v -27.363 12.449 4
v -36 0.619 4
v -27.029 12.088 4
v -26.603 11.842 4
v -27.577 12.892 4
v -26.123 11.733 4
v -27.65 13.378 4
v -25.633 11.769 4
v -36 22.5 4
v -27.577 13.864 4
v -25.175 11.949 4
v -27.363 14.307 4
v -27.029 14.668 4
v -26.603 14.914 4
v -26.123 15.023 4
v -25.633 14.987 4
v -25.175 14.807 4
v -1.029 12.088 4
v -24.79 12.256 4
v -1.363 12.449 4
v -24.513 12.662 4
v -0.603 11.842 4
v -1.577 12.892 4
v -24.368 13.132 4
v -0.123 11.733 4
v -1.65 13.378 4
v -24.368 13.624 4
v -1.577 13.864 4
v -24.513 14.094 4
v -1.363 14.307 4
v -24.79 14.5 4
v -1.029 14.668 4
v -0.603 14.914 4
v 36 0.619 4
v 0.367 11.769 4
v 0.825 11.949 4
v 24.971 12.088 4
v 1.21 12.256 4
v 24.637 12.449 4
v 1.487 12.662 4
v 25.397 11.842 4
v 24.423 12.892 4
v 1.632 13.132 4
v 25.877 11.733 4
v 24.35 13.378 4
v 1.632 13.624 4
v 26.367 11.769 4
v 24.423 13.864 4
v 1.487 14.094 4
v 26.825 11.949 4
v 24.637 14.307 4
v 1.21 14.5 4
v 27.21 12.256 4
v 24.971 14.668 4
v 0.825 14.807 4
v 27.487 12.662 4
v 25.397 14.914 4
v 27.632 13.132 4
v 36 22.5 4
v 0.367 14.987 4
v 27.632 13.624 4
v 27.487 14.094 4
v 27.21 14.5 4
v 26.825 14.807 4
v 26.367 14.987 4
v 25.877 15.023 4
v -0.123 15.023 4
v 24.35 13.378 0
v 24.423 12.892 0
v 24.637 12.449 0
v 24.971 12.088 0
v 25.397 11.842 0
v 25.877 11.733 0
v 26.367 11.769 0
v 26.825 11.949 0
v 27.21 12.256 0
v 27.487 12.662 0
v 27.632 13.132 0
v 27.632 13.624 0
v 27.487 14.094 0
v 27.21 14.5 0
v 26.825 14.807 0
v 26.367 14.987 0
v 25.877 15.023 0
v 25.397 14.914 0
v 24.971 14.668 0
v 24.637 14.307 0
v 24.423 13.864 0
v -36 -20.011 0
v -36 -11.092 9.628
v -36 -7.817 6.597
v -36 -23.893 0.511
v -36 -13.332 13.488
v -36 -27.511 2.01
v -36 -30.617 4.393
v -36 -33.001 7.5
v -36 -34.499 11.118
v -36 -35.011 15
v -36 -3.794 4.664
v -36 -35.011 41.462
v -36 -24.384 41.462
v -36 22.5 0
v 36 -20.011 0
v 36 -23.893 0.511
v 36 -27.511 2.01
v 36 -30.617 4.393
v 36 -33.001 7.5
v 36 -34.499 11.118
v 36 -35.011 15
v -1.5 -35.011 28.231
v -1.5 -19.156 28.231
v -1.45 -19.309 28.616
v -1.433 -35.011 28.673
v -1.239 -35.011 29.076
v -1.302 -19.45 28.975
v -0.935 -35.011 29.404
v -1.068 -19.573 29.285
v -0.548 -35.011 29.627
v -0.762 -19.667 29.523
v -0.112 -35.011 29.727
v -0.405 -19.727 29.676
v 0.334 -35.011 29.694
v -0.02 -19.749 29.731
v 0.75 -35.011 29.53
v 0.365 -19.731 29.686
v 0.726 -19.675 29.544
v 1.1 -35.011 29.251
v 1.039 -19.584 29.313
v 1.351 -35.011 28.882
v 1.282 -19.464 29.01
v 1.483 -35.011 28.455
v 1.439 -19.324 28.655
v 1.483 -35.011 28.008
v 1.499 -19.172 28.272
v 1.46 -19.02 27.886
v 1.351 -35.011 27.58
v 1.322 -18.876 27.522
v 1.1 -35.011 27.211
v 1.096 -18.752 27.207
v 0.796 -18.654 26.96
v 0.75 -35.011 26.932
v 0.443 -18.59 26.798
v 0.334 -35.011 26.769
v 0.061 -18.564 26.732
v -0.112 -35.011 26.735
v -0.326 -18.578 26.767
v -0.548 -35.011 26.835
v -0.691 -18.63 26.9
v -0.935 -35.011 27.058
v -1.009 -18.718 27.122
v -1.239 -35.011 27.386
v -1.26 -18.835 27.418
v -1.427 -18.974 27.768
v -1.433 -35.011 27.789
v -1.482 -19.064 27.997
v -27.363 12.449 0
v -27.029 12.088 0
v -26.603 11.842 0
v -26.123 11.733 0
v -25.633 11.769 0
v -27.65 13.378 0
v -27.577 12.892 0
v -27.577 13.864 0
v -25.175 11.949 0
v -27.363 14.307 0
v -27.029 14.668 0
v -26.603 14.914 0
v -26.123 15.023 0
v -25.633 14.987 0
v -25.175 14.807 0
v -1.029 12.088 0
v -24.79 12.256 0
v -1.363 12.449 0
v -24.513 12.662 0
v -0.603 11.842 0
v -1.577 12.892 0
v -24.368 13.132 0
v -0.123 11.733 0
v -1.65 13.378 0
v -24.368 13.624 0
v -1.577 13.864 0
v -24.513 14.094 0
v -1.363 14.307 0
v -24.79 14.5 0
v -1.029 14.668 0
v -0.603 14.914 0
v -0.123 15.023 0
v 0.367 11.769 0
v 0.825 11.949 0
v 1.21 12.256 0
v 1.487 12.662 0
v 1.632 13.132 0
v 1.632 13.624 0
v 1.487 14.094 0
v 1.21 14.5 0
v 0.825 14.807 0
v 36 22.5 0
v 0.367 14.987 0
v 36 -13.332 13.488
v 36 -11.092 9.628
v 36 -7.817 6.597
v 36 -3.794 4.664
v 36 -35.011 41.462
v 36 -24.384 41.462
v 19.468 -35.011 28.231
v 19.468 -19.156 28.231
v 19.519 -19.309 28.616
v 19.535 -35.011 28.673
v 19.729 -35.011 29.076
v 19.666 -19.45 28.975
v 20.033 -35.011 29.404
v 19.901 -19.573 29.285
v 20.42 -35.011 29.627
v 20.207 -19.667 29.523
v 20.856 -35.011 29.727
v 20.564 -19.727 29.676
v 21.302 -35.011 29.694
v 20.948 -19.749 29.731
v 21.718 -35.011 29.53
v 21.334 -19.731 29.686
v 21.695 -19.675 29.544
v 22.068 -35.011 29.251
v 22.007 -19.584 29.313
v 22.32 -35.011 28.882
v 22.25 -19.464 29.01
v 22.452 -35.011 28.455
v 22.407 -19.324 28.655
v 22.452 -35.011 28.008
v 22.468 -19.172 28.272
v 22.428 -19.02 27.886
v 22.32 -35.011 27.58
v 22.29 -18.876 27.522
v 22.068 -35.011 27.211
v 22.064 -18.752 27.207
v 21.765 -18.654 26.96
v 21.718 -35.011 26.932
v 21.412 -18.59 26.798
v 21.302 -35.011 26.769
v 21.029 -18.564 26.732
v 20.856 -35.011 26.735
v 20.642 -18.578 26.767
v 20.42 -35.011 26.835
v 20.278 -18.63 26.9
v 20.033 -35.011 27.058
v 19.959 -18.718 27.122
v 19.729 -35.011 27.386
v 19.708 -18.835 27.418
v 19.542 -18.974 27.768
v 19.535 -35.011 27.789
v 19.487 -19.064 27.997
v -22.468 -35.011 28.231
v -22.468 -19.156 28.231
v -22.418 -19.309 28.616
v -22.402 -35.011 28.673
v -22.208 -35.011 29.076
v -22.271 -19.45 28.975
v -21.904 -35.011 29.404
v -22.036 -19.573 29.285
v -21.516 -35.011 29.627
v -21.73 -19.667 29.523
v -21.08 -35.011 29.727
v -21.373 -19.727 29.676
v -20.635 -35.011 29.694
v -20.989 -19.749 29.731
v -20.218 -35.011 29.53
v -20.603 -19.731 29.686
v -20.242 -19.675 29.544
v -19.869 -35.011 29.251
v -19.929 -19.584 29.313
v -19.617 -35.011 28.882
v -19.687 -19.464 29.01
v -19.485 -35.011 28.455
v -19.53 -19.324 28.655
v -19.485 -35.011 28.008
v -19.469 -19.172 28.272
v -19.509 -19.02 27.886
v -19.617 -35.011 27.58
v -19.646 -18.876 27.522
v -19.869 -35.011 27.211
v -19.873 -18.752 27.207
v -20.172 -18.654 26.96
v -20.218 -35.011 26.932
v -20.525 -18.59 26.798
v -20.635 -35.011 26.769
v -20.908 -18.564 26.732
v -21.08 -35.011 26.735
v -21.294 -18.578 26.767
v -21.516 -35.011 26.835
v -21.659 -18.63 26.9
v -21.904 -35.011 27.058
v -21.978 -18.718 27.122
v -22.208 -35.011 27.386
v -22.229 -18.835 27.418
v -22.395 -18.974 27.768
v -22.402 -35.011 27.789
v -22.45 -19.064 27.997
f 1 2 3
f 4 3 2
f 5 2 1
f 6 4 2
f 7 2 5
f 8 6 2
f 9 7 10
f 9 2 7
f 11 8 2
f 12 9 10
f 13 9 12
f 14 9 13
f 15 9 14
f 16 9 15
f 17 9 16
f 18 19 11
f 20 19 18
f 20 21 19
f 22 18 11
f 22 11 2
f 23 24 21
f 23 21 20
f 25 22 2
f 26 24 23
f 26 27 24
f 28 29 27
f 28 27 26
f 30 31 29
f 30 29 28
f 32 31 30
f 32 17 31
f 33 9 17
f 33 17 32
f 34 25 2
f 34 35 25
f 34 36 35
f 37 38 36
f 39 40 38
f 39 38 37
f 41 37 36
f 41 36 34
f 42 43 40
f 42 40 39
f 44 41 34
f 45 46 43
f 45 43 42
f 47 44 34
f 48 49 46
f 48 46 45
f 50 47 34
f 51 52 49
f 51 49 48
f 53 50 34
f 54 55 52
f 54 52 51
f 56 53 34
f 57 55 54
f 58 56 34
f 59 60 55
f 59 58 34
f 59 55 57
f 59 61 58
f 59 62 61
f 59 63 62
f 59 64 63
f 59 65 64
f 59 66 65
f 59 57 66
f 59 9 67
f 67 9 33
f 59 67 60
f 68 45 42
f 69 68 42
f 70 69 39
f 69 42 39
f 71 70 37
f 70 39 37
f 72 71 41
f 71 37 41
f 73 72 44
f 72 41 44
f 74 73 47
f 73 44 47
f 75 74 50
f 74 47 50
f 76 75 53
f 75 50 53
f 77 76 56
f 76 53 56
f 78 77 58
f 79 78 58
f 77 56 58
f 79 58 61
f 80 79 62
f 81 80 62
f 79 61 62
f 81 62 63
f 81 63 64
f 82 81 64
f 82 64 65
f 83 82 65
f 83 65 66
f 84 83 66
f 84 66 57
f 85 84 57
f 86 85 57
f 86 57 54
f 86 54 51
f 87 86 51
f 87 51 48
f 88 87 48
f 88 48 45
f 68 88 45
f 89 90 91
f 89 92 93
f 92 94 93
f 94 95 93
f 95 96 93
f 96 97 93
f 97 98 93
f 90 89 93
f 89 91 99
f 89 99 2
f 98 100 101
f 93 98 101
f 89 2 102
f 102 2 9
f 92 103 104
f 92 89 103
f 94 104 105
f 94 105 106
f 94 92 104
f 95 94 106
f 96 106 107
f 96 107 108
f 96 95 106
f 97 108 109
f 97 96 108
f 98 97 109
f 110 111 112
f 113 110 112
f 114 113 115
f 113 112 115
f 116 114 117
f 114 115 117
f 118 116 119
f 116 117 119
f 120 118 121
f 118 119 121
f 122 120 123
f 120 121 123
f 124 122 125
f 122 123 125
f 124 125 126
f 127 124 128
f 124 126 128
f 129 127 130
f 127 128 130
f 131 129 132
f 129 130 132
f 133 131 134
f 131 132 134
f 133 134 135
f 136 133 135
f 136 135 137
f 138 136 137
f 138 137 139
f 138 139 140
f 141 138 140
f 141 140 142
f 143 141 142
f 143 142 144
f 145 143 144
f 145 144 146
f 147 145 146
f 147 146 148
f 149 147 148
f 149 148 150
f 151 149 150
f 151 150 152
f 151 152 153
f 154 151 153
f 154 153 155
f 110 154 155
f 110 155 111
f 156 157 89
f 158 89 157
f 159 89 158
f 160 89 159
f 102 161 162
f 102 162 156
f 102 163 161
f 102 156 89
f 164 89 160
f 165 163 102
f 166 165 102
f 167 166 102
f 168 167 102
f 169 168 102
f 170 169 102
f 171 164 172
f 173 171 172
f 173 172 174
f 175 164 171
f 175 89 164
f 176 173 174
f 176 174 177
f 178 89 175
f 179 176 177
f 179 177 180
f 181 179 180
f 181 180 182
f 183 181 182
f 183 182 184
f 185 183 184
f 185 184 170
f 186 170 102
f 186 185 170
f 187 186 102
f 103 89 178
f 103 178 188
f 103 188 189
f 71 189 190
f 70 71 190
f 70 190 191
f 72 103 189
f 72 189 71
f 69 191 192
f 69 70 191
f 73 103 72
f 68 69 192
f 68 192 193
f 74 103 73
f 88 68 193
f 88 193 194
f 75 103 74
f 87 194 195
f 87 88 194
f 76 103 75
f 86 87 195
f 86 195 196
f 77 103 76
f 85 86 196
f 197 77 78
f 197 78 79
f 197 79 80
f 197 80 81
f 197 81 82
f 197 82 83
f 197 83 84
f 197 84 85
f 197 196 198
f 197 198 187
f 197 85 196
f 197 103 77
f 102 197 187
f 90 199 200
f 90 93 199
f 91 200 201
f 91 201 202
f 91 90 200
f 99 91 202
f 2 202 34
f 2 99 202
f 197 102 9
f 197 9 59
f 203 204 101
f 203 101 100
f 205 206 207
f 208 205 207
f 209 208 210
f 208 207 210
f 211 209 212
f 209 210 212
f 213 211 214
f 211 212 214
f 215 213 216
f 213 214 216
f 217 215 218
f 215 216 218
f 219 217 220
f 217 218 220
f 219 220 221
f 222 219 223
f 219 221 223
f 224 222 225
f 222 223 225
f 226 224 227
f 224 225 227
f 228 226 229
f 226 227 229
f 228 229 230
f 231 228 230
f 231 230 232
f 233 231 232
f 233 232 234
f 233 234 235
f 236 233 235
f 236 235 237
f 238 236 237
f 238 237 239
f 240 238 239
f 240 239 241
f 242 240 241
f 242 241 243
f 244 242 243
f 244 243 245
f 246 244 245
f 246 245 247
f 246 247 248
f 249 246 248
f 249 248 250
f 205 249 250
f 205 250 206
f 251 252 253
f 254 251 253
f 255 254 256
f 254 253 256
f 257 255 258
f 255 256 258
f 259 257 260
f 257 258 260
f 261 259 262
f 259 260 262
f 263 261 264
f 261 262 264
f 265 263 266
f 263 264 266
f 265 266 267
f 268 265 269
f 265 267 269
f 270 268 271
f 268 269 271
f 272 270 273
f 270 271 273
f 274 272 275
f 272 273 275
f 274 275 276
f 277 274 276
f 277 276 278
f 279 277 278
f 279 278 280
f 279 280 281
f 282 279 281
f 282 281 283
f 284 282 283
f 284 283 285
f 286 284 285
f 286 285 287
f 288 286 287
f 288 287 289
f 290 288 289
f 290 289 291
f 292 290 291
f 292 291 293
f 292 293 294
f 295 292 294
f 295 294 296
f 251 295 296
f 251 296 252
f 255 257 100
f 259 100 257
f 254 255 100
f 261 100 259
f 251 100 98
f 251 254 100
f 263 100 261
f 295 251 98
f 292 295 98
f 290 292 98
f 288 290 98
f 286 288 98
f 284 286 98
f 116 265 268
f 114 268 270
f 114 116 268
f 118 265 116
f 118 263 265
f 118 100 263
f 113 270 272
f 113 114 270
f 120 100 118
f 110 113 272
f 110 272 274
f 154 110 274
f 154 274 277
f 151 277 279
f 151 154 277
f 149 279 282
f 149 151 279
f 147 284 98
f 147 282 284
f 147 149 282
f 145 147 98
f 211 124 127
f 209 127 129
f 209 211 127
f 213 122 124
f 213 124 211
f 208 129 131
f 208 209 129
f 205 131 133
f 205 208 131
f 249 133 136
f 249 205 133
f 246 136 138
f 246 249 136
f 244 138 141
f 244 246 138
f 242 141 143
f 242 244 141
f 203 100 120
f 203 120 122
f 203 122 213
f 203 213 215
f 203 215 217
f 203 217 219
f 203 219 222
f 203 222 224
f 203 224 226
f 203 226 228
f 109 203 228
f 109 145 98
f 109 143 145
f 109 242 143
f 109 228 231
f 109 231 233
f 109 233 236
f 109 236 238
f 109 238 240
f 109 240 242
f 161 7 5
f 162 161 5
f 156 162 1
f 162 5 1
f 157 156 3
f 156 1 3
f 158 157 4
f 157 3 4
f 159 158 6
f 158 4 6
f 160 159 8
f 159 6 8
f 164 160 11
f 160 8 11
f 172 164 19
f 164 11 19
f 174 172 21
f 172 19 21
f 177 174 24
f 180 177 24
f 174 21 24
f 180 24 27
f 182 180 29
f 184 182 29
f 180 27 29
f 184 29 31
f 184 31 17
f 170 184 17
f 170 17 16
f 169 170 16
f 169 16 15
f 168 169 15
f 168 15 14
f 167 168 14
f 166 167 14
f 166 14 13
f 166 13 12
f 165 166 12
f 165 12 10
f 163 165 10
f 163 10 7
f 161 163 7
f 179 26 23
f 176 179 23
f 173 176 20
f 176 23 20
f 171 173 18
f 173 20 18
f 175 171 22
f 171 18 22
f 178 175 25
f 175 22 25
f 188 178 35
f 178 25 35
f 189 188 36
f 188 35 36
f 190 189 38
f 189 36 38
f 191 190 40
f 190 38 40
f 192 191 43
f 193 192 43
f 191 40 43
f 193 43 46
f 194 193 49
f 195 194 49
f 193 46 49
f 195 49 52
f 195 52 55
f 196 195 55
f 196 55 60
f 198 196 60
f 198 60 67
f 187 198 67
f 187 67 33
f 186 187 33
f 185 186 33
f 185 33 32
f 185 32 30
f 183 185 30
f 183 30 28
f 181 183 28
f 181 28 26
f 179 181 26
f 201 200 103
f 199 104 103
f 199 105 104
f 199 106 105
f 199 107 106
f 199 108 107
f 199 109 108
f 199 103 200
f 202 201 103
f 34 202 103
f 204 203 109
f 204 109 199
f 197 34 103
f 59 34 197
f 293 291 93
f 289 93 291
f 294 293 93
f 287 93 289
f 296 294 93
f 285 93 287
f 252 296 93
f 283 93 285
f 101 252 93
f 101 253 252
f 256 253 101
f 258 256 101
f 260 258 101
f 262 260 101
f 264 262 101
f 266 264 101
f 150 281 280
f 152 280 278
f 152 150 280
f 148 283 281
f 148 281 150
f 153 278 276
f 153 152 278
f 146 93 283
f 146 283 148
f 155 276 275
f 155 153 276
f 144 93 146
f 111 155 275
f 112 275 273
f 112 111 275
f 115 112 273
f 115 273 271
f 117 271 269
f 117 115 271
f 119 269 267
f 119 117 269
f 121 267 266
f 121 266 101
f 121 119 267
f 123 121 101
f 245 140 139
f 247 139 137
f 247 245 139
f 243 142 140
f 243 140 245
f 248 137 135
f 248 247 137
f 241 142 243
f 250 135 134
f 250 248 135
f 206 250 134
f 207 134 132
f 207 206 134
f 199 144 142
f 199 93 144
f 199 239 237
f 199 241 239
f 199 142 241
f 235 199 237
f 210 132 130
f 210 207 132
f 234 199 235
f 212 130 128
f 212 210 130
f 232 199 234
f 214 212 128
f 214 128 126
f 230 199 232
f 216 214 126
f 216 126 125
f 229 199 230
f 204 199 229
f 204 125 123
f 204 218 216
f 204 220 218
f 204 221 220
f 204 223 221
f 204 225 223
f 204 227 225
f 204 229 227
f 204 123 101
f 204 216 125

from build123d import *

# Parameters (mm, degrees)
F0_W     = 72
F0_H     = 45
F1_DEPTH = 4
F2_D     = 3.3
F2_DEPTH = 8
F2_TIP   = 0.9914200214
F4_DEPTH = 72
F5_R     = 15
F7_D     = 3
F7_DEPTH = 25
F7_TIP   = 0.9012909285


with BuildPart() as f1:
    # F0 (on Top) → F1 (new body)
    with BuildSketch(Plane.XY):
        Rectangle(F0_W, F0_H)
    extrude(amount=F1_DEPTH)

    # F2
    with Locations(Plane(origin=(0, 0, 0), x_dir=(1, 0, 0), z_dir=(0, 0, -1))):
        with Locations((-26, -13.3780119941), (0, -13.3780119941), (26, -13.3780119941)):
            Hole(F2_D / 2, depth=F2_DEPTH)
            with Locations((0, 0, -(F2_DEPTH + F2_TIP / 2))):  # 118° drill point
                Cone(0, F2_D / 2, F2_TIP, mode=Mode.SUBTRACT)

    # F3 (on face) → F4 (join)
    with BuildSketch(Plane.YZ.offset(36)):
        Polygon((-22.5, 4), (-9.5828315243, 4), (-24.3840366602, 41.4623506367), (-35.0105427206, 41.4623506367), (-35.0105427206, 0), (-22.5, 0), align=None)
    extrude(amount=-F4_DEPTH)

    # F5
    f5_edges = [f1.edges().sort_by_distance(p)[0] for p in [
        (0, -35.010543, 0),
        (0, -9.582832, 4),
    ]]
    fillet(f5_edges, radius=F5_R)

    # F7
    with Locations(Plane.XZ.offset(35.0105427206)):
        with Locations((-20.9683738649, 28.2311753184), (20.9683738649, 28.2311753184), (0, 28.2311753184)):
            Hole(F7_D / 2, depth=F7_DEPTH)
            with Locations((0, 0, -(F7_DEPTH + F7_TIP / 2))):  # 118° drill point
                Cone(0, F7_D / 2, F7_TIP, mode=Mode.SUBTRACT)


solid = f1.part
